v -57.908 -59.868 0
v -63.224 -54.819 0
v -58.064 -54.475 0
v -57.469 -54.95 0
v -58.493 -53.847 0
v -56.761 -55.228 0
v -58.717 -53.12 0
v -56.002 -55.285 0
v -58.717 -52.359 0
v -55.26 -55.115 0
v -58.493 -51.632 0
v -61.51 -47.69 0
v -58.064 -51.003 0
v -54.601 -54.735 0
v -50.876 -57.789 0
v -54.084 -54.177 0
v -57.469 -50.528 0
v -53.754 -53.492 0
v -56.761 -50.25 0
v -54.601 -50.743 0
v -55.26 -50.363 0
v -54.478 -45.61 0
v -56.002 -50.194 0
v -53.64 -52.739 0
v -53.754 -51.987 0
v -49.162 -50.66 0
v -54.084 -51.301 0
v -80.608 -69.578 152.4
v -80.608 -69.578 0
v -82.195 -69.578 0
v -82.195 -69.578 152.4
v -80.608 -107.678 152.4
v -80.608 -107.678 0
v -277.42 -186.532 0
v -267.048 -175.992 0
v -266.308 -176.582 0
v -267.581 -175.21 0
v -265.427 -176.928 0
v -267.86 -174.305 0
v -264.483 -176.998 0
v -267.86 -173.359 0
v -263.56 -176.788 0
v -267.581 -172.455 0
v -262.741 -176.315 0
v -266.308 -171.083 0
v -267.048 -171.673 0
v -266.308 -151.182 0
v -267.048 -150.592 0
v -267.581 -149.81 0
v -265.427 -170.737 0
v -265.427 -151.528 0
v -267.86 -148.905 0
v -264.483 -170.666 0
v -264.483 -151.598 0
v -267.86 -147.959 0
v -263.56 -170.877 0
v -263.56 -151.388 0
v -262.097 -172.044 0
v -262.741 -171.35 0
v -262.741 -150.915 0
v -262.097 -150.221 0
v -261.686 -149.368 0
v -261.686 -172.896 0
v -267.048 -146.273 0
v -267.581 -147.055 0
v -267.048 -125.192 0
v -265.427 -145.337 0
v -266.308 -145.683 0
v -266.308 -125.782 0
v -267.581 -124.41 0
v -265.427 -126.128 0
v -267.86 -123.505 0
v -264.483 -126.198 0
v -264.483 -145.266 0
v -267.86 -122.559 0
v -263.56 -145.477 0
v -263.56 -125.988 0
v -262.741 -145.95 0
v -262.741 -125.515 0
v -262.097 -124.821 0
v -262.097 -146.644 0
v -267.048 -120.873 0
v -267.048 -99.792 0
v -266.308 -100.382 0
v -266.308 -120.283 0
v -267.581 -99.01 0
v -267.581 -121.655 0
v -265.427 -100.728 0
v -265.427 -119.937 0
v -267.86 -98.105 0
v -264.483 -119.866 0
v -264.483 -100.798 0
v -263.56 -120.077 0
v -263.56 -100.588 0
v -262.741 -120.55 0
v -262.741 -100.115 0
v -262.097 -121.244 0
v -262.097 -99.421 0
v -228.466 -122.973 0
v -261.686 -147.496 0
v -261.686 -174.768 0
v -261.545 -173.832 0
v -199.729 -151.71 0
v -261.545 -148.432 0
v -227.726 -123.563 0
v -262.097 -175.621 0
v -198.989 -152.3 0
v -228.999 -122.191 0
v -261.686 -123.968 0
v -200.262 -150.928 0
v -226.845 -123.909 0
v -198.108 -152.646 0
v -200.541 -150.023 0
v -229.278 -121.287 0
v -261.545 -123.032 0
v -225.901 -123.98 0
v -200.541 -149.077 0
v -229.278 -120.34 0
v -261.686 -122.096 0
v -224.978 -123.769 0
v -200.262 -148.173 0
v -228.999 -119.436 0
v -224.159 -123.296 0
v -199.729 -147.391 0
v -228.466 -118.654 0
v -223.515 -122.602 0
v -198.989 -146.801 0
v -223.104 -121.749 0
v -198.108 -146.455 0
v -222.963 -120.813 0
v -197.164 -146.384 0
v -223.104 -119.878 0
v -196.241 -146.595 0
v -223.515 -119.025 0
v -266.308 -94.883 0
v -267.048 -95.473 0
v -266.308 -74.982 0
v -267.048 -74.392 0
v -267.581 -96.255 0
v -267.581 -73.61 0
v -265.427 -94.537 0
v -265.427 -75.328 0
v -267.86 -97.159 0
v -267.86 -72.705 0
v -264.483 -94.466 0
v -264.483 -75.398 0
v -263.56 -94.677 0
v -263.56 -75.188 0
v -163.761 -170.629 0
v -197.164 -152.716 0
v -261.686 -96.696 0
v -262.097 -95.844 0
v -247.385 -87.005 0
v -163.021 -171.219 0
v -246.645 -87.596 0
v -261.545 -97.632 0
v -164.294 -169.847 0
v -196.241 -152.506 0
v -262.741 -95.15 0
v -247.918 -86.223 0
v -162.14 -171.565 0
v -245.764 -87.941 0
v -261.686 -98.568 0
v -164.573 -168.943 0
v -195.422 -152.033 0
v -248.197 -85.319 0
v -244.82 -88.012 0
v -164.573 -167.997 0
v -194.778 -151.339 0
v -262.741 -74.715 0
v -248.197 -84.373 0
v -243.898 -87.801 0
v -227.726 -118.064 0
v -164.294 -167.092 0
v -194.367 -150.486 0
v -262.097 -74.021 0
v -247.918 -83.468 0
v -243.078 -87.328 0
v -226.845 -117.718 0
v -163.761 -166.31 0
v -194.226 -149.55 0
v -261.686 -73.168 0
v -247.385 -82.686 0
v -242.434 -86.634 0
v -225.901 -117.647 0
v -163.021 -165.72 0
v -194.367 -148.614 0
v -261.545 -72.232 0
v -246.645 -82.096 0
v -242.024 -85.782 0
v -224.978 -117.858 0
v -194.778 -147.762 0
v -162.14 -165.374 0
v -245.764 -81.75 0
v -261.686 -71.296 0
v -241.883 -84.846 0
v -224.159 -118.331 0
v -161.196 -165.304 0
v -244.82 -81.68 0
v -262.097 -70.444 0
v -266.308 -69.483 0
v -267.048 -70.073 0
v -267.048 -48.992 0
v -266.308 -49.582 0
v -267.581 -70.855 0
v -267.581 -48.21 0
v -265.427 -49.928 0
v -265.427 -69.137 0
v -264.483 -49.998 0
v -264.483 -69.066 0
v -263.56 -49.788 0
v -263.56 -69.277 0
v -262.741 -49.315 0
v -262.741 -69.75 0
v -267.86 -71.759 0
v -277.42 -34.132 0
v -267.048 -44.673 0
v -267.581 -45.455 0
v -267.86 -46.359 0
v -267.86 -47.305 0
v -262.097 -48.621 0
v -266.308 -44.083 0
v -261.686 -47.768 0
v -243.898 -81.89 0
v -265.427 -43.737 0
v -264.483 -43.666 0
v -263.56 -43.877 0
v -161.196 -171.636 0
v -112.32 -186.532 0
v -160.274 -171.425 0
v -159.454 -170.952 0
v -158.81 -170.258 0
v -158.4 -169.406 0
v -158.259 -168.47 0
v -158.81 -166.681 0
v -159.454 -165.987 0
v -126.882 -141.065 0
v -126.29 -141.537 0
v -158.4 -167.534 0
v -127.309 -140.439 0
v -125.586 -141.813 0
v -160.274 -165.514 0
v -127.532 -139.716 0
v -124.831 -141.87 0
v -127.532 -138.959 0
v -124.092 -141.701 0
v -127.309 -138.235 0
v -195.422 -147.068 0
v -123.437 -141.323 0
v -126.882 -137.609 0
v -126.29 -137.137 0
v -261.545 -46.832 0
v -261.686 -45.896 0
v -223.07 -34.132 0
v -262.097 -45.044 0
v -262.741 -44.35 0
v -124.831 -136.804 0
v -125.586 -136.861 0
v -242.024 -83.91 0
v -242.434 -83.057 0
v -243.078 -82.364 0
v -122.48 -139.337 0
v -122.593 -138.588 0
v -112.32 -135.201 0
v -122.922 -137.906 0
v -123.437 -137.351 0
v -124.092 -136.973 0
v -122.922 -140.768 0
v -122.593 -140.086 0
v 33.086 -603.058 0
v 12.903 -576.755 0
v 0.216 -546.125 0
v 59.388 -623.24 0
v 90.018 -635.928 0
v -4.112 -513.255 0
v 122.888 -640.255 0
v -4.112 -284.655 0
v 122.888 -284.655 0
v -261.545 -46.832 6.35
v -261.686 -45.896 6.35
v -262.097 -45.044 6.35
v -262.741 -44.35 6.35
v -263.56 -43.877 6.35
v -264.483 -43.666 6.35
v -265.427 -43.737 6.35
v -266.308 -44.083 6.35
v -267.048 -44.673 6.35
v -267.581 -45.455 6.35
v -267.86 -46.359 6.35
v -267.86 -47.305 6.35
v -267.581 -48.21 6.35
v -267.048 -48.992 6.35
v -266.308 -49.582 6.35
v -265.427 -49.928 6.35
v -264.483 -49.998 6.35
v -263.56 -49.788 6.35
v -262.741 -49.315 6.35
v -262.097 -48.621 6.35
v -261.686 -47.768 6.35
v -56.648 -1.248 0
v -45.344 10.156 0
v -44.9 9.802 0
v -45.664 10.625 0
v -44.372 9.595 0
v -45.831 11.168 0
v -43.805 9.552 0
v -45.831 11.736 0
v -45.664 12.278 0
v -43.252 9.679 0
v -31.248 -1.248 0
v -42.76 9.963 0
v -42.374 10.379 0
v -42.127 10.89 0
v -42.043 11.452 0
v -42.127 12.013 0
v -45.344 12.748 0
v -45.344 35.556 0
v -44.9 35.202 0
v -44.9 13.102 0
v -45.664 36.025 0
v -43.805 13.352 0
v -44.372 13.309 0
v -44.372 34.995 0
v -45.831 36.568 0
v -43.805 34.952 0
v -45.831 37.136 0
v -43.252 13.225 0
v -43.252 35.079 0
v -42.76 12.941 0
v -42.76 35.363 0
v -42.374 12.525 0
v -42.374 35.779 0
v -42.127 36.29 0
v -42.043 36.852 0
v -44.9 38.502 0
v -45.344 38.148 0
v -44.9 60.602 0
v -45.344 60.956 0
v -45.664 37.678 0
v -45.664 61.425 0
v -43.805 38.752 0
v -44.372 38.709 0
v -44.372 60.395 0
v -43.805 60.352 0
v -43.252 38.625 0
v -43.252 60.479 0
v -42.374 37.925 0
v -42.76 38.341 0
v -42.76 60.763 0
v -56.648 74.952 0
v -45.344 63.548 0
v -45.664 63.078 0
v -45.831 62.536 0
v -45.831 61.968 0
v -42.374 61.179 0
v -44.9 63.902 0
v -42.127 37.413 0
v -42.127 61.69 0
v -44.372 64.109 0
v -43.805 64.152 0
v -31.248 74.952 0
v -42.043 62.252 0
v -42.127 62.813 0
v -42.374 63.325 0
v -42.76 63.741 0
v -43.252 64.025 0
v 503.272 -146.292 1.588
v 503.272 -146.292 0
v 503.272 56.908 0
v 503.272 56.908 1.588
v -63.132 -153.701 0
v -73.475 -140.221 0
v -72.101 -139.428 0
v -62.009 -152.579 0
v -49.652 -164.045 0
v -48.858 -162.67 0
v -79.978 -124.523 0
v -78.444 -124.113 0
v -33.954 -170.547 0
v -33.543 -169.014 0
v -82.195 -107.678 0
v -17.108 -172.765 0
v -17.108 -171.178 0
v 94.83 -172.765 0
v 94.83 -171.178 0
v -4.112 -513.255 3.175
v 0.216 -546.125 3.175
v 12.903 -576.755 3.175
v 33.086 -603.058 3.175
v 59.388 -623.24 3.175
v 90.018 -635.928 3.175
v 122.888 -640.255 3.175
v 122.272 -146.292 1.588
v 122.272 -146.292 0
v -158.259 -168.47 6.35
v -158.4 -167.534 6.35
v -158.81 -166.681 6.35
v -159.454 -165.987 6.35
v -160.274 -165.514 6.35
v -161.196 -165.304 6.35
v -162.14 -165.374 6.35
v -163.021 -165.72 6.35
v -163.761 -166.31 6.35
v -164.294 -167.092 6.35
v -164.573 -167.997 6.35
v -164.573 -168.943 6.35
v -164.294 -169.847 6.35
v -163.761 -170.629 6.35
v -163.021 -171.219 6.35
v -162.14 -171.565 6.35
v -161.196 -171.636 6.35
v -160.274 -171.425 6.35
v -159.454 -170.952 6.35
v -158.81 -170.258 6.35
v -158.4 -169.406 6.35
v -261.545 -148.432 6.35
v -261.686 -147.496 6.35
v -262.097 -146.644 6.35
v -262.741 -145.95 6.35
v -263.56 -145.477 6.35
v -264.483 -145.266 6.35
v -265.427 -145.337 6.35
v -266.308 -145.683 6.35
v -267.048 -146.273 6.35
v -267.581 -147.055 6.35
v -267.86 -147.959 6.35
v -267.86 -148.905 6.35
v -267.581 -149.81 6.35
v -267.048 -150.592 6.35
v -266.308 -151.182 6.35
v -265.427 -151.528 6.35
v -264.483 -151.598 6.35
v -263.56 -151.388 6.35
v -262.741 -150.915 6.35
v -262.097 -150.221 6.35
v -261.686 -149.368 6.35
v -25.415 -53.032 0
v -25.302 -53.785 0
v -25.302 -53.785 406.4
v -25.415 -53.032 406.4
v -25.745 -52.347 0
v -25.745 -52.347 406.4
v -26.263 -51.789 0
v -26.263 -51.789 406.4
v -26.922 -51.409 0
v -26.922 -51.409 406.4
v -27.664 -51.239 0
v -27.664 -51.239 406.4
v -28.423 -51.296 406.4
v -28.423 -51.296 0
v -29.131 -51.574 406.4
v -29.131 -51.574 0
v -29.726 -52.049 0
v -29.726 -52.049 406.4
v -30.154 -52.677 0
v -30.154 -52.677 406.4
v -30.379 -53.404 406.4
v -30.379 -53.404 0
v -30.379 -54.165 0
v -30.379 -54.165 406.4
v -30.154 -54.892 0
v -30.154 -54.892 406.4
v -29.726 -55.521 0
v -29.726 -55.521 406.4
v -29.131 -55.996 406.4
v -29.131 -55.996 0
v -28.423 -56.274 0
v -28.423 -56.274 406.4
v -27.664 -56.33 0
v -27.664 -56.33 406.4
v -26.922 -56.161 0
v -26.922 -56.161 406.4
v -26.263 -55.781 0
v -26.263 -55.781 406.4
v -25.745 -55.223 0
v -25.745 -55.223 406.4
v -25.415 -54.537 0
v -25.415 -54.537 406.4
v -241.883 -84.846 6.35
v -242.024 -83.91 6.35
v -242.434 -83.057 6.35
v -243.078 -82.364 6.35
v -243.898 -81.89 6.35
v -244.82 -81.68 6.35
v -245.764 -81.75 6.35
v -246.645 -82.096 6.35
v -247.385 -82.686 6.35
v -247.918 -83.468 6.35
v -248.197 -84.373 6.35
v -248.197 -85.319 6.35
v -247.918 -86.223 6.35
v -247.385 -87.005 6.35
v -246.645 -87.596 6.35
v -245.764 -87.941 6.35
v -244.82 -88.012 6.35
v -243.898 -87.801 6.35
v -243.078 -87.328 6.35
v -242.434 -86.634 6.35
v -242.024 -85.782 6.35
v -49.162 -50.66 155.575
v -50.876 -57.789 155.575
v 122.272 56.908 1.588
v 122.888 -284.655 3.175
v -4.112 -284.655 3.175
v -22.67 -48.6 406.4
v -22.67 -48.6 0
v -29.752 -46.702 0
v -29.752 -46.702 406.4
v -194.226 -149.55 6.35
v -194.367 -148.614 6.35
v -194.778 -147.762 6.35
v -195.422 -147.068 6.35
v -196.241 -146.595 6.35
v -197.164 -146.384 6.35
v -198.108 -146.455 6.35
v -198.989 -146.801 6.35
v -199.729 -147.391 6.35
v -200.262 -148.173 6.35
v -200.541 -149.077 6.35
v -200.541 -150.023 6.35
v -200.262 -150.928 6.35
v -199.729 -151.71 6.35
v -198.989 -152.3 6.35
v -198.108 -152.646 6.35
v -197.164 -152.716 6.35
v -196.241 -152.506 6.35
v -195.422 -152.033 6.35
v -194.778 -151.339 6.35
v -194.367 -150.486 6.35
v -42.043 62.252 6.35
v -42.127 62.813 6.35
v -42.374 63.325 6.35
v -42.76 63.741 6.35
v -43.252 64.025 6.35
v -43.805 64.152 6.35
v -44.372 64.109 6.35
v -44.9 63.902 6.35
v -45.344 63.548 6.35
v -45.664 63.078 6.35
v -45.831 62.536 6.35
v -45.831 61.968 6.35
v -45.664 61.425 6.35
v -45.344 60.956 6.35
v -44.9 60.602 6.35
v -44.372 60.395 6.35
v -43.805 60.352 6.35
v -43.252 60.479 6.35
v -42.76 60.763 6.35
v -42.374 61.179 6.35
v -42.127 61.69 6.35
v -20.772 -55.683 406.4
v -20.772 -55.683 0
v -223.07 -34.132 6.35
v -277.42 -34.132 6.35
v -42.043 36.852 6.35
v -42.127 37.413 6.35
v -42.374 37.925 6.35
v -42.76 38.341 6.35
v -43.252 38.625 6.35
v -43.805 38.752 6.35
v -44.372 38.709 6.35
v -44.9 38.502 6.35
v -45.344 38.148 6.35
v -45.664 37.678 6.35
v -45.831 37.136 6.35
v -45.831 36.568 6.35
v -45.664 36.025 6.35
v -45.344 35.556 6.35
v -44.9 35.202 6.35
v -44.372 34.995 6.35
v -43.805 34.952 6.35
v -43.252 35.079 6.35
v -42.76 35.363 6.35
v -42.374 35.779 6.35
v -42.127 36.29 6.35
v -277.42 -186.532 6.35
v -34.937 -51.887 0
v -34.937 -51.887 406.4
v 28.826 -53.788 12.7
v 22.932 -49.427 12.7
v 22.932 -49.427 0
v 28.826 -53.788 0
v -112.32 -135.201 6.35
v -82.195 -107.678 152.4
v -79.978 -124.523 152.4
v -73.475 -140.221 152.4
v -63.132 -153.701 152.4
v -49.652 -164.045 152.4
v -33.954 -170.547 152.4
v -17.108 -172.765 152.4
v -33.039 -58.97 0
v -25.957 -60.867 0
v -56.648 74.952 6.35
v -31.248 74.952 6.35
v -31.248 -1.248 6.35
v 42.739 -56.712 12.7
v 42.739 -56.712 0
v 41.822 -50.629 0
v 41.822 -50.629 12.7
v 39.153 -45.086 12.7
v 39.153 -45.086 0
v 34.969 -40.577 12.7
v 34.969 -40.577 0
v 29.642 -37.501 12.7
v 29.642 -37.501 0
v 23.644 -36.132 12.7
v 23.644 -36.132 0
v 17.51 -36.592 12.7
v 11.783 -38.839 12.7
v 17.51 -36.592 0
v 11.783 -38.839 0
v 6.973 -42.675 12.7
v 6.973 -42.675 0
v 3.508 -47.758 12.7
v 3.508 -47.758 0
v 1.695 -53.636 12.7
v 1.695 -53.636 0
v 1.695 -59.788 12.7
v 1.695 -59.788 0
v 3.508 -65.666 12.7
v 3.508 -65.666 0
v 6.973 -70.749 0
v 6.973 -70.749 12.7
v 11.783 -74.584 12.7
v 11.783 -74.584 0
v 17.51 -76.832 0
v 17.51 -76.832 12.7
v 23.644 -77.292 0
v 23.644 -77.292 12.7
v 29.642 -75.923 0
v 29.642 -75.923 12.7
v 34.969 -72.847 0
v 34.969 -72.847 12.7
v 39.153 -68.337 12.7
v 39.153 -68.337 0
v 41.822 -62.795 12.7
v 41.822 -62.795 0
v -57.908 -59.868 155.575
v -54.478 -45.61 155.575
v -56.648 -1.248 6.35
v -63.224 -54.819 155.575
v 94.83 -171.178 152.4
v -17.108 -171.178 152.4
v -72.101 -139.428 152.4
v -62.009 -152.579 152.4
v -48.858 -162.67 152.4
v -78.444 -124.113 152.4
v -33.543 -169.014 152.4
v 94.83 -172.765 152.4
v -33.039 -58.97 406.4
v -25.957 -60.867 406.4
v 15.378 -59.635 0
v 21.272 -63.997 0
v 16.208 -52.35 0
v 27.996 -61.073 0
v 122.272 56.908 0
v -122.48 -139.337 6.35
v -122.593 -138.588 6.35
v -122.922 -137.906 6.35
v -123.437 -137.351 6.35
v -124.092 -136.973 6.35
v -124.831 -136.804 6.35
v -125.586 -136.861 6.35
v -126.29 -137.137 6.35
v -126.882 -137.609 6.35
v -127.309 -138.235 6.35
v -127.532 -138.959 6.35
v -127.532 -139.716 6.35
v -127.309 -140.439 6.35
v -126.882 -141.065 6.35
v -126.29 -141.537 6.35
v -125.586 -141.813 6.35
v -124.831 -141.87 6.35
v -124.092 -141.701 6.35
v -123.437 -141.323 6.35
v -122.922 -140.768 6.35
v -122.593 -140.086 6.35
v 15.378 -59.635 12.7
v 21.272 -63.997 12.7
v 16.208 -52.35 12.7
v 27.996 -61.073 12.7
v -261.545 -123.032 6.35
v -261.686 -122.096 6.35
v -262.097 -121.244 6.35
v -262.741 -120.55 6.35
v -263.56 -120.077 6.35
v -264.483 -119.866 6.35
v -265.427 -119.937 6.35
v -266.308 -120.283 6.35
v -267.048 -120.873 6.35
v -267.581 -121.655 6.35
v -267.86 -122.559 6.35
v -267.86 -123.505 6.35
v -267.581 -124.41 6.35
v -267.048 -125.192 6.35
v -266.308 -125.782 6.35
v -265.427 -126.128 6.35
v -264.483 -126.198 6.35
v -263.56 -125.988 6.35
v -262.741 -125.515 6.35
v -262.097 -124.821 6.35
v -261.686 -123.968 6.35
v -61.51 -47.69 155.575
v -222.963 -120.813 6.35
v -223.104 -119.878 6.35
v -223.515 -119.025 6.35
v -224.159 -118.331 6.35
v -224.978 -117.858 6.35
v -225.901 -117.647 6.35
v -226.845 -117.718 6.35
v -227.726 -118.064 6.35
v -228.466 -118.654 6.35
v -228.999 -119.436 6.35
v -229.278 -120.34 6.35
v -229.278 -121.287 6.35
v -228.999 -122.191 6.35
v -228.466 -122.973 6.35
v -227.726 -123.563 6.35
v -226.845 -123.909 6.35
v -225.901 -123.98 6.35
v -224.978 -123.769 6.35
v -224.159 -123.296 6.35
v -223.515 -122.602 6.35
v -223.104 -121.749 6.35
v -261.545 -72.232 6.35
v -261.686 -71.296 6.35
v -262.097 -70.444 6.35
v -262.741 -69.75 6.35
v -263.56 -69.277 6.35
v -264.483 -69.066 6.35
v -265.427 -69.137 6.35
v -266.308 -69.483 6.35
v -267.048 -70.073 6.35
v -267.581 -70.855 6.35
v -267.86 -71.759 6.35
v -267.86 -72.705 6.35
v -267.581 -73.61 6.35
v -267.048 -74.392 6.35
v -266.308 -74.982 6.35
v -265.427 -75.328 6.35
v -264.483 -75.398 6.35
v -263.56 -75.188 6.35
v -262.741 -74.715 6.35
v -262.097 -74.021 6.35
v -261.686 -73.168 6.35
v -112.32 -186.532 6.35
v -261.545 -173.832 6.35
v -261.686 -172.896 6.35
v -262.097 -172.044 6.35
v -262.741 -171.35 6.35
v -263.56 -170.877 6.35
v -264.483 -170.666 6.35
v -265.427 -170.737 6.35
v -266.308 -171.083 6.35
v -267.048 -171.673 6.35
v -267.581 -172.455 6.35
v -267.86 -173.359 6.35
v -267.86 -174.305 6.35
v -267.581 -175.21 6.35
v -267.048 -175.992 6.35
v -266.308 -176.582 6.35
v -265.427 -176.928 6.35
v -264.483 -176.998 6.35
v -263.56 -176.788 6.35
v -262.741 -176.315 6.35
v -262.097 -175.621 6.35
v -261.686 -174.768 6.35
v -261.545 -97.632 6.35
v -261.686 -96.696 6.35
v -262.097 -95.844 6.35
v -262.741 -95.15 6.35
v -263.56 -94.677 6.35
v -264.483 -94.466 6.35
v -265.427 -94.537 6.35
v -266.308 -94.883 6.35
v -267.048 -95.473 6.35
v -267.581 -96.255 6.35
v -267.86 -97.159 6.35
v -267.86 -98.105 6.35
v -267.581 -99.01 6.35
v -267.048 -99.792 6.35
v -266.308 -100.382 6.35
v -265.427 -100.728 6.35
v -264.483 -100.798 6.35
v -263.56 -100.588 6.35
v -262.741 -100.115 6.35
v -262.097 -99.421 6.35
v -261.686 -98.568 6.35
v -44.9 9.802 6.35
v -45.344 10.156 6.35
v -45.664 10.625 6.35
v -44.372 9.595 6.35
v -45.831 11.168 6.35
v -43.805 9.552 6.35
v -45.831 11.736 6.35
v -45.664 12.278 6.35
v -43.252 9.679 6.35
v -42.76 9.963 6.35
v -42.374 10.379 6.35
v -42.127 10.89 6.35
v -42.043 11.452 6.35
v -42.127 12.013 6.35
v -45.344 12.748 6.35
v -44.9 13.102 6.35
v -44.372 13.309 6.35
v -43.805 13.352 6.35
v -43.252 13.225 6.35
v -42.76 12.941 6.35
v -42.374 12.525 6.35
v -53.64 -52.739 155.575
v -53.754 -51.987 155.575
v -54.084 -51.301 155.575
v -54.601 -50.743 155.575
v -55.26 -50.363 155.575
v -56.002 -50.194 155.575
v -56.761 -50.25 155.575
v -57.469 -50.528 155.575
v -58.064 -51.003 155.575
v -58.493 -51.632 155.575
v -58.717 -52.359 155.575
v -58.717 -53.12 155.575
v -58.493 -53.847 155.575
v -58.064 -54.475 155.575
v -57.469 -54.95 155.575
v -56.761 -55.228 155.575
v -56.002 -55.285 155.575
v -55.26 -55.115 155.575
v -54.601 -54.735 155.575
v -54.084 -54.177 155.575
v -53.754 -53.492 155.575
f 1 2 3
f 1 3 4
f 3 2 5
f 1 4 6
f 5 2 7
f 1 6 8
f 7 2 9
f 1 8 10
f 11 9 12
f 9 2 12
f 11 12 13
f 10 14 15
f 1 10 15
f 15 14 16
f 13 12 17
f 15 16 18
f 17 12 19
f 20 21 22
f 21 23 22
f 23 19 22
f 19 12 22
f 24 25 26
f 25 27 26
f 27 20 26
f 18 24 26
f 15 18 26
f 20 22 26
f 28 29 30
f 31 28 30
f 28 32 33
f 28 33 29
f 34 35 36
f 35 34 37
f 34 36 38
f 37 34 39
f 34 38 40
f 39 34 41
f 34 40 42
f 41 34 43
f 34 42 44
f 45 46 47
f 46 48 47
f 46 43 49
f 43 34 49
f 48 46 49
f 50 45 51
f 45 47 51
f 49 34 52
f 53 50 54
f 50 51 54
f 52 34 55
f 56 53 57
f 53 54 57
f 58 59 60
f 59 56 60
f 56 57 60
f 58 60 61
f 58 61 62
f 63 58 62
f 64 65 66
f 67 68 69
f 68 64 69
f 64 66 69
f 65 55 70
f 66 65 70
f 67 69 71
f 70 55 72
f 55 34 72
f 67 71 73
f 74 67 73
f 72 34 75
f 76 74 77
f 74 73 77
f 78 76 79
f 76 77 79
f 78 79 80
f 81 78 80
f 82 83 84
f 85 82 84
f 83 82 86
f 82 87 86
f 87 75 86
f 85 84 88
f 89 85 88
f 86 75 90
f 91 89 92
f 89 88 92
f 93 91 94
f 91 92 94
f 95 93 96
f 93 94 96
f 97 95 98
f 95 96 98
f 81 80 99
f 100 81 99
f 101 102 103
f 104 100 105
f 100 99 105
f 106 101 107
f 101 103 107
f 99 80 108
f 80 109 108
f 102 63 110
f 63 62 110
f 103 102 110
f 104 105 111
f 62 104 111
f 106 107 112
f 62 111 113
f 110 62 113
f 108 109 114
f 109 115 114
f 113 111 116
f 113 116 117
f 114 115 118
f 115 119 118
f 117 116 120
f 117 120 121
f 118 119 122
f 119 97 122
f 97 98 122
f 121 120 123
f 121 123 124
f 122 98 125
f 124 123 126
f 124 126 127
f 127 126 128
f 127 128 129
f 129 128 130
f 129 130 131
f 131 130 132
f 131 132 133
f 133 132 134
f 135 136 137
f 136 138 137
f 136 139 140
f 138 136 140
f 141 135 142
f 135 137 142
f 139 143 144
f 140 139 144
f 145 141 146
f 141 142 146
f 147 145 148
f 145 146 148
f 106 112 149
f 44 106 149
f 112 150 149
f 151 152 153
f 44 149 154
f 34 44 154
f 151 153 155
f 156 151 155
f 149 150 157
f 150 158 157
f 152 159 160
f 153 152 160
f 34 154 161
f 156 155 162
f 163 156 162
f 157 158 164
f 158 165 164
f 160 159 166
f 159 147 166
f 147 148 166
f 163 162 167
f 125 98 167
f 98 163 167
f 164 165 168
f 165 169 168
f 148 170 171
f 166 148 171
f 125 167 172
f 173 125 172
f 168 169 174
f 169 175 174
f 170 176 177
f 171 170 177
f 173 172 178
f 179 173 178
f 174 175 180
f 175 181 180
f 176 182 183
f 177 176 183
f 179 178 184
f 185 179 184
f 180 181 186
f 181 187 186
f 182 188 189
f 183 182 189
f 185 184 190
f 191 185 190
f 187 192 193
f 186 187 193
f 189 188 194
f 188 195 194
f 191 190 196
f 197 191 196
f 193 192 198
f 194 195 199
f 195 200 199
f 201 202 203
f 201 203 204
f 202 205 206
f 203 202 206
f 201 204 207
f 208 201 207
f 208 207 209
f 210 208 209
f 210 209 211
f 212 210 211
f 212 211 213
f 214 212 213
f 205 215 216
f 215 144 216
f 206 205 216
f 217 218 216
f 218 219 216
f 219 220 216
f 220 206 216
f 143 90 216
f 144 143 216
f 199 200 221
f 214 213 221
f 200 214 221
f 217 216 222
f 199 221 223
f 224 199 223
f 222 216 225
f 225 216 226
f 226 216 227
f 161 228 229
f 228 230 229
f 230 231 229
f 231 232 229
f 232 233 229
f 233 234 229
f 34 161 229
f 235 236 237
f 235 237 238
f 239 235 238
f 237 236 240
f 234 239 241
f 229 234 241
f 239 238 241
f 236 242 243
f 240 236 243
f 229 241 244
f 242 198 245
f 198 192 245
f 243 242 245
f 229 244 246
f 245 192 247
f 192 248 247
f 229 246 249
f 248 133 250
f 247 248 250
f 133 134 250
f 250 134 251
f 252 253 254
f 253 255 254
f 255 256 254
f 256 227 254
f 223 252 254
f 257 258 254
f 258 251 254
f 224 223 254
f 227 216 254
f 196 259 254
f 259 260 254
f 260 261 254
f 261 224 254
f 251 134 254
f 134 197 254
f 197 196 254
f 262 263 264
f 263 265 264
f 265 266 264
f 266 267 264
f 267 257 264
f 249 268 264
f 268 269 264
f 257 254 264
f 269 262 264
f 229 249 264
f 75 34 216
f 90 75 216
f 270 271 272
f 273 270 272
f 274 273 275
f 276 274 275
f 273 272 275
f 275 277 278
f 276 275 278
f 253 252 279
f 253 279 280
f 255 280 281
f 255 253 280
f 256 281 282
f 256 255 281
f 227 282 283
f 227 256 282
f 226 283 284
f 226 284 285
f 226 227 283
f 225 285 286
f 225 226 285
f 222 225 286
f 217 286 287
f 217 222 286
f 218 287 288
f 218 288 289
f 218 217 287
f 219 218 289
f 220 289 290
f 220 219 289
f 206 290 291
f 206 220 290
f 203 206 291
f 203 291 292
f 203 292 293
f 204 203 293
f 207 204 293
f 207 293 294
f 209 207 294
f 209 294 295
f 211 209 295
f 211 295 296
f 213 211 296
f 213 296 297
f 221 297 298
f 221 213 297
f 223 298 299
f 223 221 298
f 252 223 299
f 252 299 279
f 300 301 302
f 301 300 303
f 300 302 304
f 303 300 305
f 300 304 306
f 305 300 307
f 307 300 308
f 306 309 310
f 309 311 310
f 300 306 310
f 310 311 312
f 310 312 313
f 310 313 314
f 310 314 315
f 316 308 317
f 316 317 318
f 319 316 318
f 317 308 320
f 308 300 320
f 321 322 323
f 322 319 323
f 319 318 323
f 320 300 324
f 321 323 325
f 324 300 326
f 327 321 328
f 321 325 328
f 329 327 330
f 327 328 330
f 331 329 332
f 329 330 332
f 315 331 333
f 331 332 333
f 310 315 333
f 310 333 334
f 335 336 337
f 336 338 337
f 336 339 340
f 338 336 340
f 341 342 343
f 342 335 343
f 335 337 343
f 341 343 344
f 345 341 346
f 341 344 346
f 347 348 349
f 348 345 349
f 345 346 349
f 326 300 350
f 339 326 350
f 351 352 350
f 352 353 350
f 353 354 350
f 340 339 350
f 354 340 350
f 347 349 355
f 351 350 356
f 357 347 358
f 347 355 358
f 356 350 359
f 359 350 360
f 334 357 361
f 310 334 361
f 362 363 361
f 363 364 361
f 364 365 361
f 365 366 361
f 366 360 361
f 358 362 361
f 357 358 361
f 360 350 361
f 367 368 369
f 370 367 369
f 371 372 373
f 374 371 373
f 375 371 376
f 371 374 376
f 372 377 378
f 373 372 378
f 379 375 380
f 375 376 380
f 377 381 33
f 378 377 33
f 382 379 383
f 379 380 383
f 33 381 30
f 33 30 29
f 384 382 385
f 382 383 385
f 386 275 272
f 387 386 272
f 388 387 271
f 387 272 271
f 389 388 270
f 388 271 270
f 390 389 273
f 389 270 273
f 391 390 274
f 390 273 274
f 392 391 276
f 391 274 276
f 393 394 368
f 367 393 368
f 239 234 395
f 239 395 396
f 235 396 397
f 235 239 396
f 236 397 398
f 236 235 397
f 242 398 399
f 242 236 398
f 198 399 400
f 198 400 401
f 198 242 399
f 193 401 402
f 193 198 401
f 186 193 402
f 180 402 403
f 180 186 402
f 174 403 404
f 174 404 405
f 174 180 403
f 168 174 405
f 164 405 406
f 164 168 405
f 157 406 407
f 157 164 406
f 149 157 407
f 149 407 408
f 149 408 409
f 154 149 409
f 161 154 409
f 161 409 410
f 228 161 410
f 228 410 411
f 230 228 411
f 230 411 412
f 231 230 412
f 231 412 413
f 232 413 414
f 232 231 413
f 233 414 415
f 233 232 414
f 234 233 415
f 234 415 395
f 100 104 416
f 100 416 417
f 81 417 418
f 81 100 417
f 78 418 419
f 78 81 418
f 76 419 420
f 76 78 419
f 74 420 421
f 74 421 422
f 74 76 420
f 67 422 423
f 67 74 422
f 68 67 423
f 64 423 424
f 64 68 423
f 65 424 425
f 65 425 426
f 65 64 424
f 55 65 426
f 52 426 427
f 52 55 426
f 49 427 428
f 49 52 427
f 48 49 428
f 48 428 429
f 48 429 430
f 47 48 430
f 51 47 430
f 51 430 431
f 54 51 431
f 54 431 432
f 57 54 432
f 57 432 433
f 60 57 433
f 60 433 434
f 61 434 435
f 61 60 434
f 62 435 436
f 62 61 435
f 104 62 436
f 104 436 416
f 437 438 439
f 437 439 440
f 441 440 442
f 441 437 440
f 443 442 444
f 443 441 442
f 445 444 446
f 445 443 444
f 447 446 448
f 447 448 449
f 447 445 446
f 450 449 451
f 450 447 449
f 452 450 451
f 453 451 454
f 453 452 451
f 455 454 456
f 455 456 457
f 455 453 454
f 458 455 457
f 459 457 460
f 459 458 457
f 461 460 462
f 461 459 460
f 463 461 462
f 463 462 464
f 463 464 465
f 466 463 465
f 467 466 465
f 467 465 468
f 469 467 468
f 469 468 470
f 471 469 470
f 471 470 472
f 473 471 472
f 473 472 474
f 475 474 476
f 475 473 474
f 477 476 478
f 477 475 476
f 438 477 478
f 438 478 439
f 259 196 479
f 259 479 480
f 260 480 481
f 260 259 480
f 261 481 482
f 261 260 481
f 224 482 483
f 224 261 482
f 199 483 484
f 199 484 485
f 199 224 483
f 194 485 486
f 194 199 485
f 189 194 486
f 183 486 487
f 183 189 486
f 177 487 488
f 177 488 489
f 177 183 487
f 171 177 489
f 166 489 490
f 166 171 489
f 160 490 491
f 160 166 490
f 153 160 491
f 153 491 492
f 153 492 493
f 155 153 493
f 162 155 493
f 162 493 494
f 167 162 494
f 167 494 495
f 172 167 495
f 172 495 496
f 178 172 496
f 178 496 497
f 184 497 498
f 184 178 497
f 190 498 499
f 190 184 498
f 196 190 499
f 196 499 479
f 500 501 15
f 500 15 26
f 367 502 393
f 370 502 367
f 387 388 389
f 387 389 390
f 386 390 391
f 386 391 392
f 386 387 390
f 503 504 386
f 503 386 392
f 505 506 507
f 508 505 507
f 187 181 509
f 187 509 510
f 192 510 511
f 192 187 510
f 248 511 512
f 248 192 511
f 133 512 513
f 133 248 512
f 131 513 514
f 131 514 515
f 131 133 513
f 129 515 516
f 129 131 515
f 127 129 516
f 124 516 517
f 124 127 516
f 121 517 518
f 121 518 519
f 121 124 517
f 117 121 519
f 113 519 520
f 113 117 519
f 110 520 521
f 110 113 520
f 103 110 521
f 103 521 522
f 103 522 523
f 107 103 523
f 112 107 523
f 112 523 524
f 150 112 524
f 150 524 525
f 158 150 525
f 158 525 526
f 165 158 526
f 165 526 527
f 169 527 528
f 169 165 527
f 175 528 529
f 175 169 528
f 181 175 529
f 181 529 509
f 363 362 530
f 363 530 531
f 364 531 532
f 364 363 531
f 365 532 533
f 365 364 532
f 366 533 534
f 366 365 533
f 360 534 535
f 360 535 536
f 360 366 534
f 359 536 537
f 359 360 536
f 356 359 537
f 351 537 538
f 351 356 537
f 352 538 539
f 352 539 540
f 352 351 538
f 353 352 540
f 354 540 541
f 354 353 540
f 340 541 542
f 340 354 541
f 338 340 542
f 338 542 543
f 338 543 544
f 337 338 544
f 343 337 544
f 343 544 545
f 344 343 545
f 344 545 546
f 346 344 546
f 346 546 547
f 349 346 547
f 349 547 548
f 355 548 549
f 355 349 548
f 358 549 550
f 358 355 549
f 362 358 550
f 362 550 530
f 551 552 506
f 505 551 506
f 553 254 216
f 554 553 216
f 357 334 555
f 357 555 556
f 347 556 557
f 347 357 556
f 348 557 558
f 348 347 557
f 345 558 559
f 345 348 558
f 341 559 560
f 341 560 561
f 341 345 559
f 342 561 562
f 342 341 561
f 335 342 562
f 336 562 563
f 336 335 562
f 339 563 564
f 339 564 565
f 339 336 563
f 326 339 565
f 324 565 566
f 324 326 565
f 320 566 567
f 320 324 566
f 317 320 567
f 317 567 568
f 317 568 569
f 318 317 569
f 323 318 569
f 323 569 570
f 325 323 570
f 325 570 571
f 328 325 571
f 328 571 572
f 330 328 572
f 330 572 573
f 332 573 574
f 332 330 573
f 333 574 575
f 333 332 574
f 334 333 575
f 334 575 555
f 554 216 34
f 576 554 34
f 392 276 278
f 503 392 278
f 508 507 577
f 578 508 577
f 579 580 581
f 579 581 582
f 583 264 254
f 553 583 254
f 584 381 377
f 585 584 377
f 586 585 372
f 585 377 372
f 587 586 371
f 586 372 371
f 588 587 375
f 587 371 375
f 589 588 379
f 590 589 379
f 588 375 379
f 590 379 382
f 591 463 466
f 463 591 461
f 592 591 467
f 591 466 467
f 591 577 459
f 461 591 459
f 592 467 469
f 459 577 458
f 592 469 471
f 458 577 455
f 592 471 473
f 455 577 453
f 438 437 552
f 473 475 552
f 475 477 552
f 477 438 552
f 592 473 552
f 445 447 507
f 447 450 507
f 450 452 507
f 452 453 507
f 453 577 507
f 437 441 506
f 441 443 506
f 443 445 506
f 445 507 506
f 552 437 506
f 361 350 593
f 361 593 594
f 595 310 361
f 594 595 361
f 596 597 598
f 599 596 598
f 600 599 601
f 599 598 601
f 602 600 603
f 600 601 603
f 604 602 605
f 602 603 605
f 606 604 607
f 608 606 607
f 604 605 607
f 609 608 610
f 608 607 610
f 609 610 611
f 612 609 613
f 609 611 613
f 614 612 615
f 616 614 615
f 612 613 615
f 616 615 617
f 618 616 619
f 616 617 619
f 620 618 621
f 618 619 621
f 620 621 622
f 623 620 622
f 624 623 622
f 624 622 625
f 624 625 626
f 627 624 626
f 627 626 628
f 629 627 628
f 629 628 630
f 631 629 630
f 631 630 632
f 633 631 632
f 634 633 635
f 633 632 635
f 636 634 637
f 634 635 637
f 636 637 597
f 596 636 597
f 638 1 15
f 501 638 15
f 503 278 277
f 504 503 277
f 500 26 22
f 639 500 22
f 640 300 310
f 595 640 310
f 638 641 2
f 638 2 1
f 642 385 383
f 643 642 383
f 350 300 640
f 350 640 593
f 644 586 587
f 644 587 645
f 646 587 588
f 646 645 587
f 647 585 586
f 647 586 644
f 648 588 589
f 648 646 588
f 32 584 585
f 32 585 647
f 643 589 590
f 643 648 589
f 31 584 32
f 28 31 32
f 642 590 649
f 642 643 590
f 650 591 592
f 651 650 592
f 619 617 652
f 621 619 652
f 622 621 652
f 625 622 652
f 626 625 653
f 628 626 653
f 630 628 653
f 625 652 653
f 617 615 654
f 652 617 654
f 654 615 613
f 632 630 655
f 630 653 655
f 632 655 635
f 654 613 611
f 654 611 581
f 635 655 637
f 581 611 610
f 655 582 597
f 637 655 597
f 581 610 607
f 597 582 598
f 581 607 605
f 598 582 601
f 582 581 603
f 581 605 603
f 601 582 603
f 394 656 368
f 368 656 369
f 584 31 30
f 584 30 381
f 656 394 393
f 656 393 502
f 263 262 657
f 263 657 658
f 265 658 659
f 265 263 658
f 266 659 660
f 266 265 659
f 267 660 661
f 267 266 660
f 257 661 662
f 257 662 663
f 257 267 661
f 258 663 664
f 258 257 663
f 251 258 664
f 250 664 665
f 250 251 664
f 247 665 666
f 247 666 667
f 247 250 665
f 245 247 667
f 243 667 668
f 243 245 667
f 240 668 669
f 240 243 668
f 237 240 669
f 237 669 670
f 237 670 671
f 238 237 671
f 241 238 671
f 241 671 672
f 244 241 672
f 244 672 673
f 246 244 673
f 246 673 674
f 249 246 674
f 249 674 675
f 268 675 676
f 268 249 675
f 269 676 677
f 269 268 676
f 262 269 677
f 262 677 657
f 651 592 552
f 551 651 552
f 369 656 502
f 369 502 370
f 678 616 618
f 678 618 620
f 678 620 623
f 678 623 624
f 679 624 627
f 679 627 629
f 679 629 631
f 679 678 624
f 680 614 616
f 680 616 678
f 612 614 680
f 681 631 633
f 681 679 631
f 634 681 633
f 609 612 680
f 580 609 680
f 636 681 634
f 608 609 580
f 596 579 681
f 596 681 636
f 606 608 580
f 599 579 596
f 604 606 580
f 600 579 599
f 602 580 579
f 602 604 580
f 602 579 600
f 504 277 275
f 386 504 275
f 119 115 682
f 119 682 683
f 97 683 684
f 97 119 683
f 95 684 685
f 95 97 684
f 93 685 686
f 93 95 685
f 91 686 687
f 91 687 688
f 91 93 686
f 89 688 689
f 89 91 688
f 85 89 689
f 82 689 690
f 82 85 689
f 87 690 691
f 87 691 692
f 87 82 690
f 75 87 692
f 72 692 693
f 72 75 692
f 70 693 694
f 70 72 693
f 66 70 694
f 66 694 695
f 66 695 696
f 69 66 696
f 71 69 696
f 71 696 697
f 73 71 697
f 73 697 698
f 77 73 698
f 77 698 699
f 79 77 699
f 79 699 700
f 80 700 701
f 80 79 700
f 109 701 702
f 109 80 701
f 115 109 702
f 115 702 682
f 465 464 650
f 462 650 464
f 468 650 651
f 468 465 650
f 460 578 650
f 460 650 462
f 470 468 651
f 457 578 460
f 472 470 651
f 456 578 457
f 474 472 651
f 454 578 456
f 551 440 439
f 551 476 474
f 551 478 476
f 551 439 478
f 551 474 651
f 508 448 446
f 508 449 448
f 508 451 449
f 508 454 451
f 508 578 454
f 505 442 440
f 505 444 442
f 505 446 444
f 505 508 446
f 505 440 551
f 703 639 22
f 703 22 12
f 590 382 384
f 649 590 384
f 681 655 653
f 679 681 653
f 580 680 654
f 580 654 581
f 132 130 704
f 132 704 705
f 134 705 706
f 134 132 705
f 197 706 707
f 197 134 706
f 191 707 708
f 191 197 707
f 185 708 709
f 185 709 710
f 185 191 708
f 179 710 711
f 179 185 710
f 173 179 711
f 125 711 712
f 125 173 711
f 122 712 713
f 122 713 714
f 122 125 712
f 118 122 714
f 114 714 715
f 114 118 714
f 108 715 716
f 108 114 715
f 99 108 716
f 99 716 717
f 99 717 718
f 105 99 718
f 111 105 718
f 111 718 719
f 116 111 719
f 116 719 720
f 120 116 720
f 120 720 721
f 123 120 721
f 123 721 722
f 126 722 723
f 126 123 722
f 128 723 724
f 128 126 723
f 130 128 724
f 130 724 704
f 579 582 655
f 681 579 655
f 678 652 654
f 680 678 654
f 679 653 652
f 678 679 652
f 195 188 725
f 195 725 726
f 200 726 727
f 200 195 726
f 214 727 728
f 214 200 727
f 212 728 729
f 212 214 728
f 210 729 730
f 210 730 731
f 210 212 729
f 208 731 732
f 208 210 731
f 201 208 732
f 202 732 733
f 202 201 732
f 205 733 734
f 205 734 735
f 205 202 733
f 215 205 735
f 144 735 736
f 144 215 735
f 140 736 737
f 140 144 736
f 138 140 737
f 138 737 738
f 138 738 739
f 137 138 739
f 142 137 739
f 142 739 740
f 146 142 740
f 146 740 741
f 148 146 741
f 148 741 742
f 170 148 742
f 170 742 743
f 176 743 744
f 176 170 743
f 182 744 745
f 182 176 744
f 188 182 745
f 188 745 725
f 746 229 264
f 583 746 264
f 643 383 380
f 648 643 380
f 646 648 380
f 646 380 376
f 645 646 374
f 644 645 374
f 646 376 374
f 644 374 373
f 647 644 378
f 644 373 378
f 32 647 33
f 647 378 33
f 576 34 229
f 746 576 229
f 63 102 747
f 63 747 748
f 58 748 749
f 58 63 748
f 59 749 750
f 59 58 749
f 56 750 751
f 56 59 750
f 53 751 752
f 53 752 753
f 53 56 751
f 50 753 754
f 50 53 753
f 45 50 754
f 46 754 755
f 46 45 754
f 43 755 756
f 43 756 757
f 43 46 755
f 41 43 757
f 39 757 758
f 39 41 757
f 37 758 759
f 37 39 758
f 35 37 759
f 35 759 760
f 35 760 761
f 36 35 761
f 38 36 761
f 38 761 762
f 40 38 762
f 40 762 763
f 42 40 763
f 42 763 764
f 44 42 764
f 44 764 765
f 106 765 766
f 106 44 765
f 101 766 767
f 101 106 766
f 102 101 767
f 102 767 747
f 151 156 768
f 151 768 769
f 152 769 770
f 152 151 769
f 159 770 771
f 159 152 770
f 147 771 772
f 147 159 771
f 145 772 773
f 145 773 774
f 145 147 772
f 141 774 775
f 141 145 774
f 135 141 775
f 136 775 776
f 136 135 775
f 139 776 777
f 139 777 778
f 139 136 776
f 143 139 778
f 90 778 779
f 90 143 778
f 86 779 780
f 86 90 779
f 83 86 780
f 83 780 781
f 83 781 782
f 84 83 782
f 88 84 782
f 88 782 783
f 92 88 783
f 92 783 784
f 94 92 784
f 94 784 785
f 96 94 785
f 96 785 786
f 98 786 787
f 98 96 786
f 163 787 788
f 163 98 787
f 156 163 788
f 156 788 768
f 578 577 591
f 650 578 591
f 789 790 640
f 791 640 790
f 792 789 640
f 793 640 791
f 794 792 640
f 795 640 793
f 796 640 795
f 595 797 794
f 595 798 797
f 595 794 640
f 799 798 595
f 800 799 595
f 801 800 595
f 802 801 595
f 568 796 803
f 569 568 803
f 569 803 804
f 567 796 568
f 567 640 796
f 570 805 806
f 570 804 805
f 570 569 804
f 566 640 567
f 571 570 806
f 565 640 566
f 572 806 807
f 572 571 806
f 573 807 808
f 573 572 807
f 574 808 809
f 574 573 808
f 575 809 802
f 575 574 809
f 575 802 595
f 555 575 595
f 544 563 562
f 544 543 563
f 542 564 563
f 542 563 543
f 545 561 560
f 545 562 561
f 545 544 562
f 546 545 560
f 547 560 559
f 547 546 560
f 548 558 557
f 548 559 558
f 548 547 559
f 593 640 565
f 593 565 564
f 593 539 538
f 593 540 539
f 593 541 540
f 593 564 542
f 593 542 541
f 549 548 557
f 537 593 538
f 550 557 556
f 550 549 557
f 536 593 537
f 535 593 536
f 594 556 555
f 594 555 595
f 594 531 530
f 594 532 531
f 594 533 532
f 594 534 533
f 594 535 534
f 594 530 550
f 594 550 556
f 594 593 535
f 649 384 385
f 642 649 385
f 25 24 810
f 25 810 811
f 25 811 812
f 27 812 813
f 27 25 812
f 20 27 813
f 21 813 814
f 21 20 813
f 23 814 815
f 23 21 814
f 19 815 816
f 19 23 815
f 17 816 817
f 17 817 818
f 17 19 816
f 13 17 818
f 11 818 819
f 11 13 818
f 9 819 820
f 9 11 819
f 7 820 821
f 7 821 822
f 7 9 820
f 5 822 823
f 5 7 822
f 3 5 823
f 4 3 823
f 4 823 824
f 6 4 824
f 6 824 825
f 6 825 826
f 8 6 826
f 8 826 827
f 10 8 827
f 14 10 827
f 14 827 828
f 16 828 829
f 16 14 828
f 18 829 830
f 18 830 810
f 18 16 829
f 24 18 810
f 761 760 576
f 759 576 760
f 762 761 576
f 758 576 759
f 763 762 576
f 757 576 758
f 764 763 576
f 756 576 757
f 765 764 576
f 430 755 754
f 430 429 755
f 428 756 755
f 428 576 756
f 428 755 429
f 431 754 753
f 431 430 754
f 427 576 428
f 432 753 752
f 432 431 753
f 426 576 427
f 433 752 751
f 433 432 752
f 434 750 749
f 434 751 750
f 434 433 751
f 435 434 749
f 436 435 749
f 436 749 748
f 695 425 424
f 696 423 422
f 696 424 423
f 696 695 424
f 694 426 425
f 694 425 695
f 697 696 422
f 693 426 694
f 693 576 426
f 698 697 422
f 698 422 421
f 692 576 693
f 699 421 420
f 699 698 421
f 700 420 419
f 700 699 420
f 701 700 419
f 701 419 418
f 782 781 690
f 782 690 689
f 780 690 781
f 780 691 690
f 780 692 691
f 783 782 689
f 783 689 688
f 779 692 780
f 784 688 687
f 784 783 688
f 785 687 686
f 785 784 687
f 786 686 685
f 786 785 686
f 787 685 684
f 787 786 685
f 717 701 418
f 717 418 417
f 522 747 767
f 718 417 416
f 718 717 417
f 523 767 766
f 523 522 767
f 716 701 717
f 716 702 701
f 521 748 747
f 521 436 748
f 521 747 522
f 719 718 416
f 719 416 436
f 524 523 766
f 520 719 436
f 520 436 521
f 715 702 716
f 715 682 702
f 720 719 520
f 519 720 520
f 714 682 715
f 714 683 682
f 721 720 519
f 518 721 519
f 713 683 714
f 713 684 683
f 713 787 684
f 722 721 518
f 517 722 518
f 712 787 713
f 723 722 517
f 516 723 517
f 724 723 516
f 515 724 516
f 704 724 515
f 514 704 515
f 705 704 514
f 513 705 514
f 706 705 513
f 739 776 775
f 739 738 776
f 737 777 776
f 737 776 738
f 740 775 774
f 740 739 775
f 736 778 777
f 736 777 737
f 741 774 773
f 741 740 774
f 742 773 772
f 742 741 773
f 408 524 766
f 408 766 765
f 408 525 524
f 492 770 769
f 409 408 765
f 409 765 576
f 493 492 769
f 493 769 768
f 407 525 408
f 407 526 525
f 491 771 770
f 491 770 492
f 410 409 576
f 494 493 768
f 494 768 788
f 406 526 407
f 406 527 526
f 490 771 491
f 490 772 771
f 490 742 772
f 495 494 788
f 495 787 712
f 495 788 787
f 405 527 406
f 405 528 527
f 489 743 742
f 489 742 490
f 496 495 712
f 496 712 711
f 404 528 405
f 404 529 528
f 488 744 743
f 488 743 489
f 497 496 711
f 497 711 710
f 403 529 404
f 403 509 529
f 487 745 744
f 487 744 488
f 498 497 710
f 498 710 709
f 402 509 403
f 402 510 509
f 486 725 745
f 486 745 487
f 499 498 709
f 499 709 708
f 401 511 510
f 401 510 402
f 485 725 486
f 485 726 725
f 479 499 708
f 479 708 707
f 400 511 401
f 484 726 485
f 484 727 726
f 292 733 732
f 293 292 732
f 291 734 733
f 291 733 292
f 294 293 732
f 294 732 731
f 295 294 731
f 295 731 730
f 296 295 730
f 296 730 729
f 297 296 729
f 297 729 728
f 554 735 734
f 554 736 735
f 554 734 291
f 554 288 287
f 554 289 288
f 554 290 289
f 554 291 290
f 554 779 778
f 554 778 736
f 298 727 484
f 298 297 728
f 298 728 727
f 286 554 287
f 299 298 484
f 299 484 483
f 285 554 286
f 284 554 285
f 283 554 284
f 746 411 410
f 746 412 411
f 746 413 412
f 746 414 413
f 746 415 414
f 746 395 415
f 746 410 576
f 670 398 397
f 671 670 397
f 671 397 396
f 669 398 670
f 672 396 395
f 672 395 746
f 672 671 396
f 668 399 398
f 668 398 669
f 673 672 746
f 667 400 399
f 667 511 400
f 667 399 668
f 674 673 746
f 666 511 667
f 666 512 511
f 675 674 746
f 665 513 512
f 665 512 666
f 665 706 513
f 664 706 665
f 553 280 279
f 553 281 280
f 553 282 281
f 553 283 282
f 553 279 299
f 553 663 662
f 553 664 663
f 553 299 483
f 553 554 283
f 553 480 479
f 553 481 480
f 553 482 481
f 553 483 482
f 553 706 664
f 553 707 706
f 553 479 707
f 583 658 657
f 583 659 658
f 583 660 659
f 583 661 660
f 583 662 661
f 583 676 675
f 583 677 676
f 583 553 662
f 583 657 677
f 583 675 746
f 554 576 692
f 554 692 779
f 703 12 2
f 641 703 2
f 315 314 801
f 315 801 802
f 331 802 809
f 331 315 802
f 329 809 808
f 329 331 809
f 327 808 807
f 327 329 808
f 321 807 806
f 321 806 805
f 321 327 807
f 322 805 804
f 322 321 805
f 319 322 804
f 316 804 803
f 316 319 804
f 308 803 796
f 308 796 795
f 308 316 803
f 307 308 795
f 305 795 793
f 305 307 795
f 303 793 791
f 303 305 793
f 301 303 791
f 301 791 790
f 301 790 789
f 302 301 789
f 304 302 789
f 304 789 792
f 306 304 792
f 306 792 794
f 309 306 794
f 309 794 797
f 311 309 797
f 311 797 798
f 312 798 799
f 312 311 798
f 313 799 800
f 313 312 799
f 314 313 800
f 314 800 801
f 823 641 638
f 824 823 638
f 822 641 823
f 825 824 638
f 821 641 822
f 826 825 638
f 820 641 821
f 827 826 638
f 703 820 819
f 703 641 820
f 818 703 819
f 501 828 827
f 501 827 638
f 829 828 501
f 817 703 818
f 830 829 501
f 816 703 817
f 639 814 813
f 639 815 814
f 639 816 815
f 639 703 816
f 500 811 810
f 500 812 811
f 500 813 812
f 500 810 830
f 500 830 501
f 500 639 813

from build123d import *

# Parameters (mm, degrees)
F0_W      = 25.4
F0_H      = 76.2
F0_R      = 1.905
F1_DEPTH  = 6.35
F2_W      = 381
F2_H      = 203.2
F3_DEPTH  = 1.5875
F4_R      = 3.175
F4_R_2    = 2.54
F5_DEPTH  = 6.35
F7_DEPTH  = 3.175
F8_R      = 2.5527
F9_DEPTH  = 155.575
F11_DEPTH = 152.4
F12_R     = 2.5527
F13_DEPTH = 406.4
F14_R     = 20.6375
F15_DEPTH = 12.7


# Not quite as in the source:
# - a length typed as a fraction of an inch, garbled in the dataset ("3 / 203.2 mm" for 3/8 in), is restored


with BuildPart() as f1:
    # F0 (on Top) → F1 (new body)
    with BuildSketch(Plane.XY):
        with Locations((-43.9476225885, 36.8518919408)):
            Rectangle(F0_W, F0_H)
        with Locations((-43.9476225885, 11.4518919408)):
            Circle(F0_R, mode=Mode.SUBTRACT)
        with Locations((-43.9476225885, 36.8518919408)):
            Circle(F0_R, mode=Mode.SUBTRACT)
        with Locations((-43.9476225885, 62.2518919408)):
            Circle(F0_R, mode=Mode.SUBTRACT)
    extrude(amount=F1_DEPTH)


with BuildPart() as f3:
    # F2 (on Top) → F3 (new body)
    with BuildSketch(Plane.XY):
        with Locations((312.7722548485, -44.6919236064)):
            Rectangle(F2_W, F2_H)
    extrude(amount=F3_DEPTH)


with BuildPart() as f5:
    # F4 (on Top) → F5 (new body)
    with BuildSketch(Plane.XY):
        Polygon((-223.0699211359, -34.1322505951), (-277.4203166646, -34.1322505951), (-277.4203166646, -186.5322505951), (-112.3203166646, -186.5322505951), (-112.3203166646, -135.2008368701), align=None)
        with Locations((-264.7203166646, -173.8322505951)):
            Circle(F4_R, mode=Mode.SUBTRACT)
        with Locations((-197.4012885681, -149.550242086)):
            Circle(F4_R, mode=Mode.SUBTRACT)
        with Locations((-264.7203166646, -148.4322505951)):
            Circle(F4_R, mode=Mode.SUBTRACT)
        with Locations((-264.7203166646, -123.0322505951)):
            Circle(F4_R, mode=Mode.SUBTRACT)
        with Locations((-226.1381081555, -120.8134224986)):
            Circle(F4_R, mode=Mode.SUBTRACT)
        with Locations((-161.433759699, -168.4697153093)):
            Circle(F4_R, mode=Mode.SUBTRACT)
        with Locations((-125.0203166646, -139.3370777369)):
            Circle(F4_R_2, mode=Mode.SUBTRACT)
        with Locations((-264.7203166646, -97.6322505951)):
            Circle(F4_R, mode=Mode.SUBTRACT)
        with Locations((-245.0575813788, -84.8458936294)):
            Circle(F4_R, mode=Mode.SUBTRACT)
        with Locations((-264.7203166646, -72.2322505951)):
            Circle(F4_R, mode=Mode.SUBTRACT)
        with Locations((-264.7203166646, -46.8322505951)):
            Circle(F4_R, mode=Mode.SUBTRACT)
    extrude(amount=F5_DEPTH)


with BuildPart() as f7:
    # F6 (on Top) → F7 (new body)
    with BuildSketch(Plane.XY):
        with BuildLine():
            Line((122.8882094549, -284.6549875146), (-4.1117905451, -284.6549875146))
            Line((-4.1117905451, -284.6549875146), (-4.1117905451, -513.2549875146))
            ThreePointArc((-4.1117905451, -513.2549875146), (33.0856482442, -603.0575487253), (122.8882094549, -640.2549875146))
            Line((122.8882094549, -640.2549875146), (122.8882094549, -513.2549875146))
            Line((122.8882094549, -513.2549875146), (122.8882094549, -284.6549875146))
        make_face()
    extrude(amount=F7_DEPTH)


with BuildPart() as f9:
    # F8 (on Top) → F9 (new body)
    with BuildSketch(Plane.XY):
        Polygon((-57.9077300241, -59.8681378041), (-50.8764464785, -57.7886222274), (-49.1617180227, -50.6595942672), (-54.4782731125, -45.6100818839), (-61.5095566582, -47.6895974606), (-63.224285114, -54.8186254207), align=None)
        with Locations((-56.1930015683, -52.739109844)):
            Circle(F8_R, mode=Mode.SUBTRACT)
    extrude(amount=F9_DEPTH)


with BuildPart() as f11:
    # F10 (on Top) → F11 (new body)
    with BuildSketch(Plane.XY):
        with BuildLine():
            ThreePointArc((-17.1079281718, -171.1775491238), (-62.0092087771, -152.5788297291), (-80.6079281718, -107.6775491238))
            Line((-80.6079281718, -107.6775491238), (-80.6079281718, -69.5775491238))
            Line((-80.6079281718, -69.5775491238), (-82.1954281718, -69.5775491238))
            Line((-82.1954281718, -69.5775491238), (-82.1954281718, -107.6775491238))
            ThreePointArc((-82.1954281718, -107.6775491238), (-63.1317407922, -153.7013617442), (-17.1079281718, -172.7650491238))
            Line((-17.1079281718, -172.7650491238), (94.8303937912, -172.7650491238))
            Line((94.8303937912, -172.7650491238), (94.8303937912, -171.1775491238))
            Line((94.8303937912, -171.1775491238), (-17.1079281718, -171.1775491238))
        make_face()
    extrude(amount=F11_DEPTH)


with BuildPart() as f13:
    # F12 (on Top) → F13 (new body)
    with BuildSketch(Plane.XY):
        Polygon((-25.9567694114, -60.8674003933), (-20.7720161226, -55.6826471044), (-22.6697675386, -48.6001423994), (-29.7522722436, -46.7023909833), (-34.9370255325, -51.8871442722), (-33.0392741164, -58.9696489772), align=None)
        with Locations((-27.8545208275, -53.7848956883)):
            Circle(F12_R, mode=Mode.SUBTRACT)
    extrude(amount=F13_DEPTH)


with BuildPart() as f15:
    # F14 (on Top) → F15 (new body)
    with BuildSketch(Plane.XY):
        with Locations((22.1018530428, -56.7118227482)):
            Circle(F14_R)
        Polygon((28.8261292295, -53.7882216984), (27.9959039159, -61.073416223), (21.2716277292, -63.9970172728), (15.3775768562, -59.635423798), (16.2078021698, -52.3502292734), (22.9320783565, -49.4266282235), align=None, mode=Mode.SUBTRACT)
    extrude(amount=F15_DEPTH)


solid = Compound([f1.part, f3.part, f5.part, f7.part, f9.part, f11.part, f13.part, f15.part])
